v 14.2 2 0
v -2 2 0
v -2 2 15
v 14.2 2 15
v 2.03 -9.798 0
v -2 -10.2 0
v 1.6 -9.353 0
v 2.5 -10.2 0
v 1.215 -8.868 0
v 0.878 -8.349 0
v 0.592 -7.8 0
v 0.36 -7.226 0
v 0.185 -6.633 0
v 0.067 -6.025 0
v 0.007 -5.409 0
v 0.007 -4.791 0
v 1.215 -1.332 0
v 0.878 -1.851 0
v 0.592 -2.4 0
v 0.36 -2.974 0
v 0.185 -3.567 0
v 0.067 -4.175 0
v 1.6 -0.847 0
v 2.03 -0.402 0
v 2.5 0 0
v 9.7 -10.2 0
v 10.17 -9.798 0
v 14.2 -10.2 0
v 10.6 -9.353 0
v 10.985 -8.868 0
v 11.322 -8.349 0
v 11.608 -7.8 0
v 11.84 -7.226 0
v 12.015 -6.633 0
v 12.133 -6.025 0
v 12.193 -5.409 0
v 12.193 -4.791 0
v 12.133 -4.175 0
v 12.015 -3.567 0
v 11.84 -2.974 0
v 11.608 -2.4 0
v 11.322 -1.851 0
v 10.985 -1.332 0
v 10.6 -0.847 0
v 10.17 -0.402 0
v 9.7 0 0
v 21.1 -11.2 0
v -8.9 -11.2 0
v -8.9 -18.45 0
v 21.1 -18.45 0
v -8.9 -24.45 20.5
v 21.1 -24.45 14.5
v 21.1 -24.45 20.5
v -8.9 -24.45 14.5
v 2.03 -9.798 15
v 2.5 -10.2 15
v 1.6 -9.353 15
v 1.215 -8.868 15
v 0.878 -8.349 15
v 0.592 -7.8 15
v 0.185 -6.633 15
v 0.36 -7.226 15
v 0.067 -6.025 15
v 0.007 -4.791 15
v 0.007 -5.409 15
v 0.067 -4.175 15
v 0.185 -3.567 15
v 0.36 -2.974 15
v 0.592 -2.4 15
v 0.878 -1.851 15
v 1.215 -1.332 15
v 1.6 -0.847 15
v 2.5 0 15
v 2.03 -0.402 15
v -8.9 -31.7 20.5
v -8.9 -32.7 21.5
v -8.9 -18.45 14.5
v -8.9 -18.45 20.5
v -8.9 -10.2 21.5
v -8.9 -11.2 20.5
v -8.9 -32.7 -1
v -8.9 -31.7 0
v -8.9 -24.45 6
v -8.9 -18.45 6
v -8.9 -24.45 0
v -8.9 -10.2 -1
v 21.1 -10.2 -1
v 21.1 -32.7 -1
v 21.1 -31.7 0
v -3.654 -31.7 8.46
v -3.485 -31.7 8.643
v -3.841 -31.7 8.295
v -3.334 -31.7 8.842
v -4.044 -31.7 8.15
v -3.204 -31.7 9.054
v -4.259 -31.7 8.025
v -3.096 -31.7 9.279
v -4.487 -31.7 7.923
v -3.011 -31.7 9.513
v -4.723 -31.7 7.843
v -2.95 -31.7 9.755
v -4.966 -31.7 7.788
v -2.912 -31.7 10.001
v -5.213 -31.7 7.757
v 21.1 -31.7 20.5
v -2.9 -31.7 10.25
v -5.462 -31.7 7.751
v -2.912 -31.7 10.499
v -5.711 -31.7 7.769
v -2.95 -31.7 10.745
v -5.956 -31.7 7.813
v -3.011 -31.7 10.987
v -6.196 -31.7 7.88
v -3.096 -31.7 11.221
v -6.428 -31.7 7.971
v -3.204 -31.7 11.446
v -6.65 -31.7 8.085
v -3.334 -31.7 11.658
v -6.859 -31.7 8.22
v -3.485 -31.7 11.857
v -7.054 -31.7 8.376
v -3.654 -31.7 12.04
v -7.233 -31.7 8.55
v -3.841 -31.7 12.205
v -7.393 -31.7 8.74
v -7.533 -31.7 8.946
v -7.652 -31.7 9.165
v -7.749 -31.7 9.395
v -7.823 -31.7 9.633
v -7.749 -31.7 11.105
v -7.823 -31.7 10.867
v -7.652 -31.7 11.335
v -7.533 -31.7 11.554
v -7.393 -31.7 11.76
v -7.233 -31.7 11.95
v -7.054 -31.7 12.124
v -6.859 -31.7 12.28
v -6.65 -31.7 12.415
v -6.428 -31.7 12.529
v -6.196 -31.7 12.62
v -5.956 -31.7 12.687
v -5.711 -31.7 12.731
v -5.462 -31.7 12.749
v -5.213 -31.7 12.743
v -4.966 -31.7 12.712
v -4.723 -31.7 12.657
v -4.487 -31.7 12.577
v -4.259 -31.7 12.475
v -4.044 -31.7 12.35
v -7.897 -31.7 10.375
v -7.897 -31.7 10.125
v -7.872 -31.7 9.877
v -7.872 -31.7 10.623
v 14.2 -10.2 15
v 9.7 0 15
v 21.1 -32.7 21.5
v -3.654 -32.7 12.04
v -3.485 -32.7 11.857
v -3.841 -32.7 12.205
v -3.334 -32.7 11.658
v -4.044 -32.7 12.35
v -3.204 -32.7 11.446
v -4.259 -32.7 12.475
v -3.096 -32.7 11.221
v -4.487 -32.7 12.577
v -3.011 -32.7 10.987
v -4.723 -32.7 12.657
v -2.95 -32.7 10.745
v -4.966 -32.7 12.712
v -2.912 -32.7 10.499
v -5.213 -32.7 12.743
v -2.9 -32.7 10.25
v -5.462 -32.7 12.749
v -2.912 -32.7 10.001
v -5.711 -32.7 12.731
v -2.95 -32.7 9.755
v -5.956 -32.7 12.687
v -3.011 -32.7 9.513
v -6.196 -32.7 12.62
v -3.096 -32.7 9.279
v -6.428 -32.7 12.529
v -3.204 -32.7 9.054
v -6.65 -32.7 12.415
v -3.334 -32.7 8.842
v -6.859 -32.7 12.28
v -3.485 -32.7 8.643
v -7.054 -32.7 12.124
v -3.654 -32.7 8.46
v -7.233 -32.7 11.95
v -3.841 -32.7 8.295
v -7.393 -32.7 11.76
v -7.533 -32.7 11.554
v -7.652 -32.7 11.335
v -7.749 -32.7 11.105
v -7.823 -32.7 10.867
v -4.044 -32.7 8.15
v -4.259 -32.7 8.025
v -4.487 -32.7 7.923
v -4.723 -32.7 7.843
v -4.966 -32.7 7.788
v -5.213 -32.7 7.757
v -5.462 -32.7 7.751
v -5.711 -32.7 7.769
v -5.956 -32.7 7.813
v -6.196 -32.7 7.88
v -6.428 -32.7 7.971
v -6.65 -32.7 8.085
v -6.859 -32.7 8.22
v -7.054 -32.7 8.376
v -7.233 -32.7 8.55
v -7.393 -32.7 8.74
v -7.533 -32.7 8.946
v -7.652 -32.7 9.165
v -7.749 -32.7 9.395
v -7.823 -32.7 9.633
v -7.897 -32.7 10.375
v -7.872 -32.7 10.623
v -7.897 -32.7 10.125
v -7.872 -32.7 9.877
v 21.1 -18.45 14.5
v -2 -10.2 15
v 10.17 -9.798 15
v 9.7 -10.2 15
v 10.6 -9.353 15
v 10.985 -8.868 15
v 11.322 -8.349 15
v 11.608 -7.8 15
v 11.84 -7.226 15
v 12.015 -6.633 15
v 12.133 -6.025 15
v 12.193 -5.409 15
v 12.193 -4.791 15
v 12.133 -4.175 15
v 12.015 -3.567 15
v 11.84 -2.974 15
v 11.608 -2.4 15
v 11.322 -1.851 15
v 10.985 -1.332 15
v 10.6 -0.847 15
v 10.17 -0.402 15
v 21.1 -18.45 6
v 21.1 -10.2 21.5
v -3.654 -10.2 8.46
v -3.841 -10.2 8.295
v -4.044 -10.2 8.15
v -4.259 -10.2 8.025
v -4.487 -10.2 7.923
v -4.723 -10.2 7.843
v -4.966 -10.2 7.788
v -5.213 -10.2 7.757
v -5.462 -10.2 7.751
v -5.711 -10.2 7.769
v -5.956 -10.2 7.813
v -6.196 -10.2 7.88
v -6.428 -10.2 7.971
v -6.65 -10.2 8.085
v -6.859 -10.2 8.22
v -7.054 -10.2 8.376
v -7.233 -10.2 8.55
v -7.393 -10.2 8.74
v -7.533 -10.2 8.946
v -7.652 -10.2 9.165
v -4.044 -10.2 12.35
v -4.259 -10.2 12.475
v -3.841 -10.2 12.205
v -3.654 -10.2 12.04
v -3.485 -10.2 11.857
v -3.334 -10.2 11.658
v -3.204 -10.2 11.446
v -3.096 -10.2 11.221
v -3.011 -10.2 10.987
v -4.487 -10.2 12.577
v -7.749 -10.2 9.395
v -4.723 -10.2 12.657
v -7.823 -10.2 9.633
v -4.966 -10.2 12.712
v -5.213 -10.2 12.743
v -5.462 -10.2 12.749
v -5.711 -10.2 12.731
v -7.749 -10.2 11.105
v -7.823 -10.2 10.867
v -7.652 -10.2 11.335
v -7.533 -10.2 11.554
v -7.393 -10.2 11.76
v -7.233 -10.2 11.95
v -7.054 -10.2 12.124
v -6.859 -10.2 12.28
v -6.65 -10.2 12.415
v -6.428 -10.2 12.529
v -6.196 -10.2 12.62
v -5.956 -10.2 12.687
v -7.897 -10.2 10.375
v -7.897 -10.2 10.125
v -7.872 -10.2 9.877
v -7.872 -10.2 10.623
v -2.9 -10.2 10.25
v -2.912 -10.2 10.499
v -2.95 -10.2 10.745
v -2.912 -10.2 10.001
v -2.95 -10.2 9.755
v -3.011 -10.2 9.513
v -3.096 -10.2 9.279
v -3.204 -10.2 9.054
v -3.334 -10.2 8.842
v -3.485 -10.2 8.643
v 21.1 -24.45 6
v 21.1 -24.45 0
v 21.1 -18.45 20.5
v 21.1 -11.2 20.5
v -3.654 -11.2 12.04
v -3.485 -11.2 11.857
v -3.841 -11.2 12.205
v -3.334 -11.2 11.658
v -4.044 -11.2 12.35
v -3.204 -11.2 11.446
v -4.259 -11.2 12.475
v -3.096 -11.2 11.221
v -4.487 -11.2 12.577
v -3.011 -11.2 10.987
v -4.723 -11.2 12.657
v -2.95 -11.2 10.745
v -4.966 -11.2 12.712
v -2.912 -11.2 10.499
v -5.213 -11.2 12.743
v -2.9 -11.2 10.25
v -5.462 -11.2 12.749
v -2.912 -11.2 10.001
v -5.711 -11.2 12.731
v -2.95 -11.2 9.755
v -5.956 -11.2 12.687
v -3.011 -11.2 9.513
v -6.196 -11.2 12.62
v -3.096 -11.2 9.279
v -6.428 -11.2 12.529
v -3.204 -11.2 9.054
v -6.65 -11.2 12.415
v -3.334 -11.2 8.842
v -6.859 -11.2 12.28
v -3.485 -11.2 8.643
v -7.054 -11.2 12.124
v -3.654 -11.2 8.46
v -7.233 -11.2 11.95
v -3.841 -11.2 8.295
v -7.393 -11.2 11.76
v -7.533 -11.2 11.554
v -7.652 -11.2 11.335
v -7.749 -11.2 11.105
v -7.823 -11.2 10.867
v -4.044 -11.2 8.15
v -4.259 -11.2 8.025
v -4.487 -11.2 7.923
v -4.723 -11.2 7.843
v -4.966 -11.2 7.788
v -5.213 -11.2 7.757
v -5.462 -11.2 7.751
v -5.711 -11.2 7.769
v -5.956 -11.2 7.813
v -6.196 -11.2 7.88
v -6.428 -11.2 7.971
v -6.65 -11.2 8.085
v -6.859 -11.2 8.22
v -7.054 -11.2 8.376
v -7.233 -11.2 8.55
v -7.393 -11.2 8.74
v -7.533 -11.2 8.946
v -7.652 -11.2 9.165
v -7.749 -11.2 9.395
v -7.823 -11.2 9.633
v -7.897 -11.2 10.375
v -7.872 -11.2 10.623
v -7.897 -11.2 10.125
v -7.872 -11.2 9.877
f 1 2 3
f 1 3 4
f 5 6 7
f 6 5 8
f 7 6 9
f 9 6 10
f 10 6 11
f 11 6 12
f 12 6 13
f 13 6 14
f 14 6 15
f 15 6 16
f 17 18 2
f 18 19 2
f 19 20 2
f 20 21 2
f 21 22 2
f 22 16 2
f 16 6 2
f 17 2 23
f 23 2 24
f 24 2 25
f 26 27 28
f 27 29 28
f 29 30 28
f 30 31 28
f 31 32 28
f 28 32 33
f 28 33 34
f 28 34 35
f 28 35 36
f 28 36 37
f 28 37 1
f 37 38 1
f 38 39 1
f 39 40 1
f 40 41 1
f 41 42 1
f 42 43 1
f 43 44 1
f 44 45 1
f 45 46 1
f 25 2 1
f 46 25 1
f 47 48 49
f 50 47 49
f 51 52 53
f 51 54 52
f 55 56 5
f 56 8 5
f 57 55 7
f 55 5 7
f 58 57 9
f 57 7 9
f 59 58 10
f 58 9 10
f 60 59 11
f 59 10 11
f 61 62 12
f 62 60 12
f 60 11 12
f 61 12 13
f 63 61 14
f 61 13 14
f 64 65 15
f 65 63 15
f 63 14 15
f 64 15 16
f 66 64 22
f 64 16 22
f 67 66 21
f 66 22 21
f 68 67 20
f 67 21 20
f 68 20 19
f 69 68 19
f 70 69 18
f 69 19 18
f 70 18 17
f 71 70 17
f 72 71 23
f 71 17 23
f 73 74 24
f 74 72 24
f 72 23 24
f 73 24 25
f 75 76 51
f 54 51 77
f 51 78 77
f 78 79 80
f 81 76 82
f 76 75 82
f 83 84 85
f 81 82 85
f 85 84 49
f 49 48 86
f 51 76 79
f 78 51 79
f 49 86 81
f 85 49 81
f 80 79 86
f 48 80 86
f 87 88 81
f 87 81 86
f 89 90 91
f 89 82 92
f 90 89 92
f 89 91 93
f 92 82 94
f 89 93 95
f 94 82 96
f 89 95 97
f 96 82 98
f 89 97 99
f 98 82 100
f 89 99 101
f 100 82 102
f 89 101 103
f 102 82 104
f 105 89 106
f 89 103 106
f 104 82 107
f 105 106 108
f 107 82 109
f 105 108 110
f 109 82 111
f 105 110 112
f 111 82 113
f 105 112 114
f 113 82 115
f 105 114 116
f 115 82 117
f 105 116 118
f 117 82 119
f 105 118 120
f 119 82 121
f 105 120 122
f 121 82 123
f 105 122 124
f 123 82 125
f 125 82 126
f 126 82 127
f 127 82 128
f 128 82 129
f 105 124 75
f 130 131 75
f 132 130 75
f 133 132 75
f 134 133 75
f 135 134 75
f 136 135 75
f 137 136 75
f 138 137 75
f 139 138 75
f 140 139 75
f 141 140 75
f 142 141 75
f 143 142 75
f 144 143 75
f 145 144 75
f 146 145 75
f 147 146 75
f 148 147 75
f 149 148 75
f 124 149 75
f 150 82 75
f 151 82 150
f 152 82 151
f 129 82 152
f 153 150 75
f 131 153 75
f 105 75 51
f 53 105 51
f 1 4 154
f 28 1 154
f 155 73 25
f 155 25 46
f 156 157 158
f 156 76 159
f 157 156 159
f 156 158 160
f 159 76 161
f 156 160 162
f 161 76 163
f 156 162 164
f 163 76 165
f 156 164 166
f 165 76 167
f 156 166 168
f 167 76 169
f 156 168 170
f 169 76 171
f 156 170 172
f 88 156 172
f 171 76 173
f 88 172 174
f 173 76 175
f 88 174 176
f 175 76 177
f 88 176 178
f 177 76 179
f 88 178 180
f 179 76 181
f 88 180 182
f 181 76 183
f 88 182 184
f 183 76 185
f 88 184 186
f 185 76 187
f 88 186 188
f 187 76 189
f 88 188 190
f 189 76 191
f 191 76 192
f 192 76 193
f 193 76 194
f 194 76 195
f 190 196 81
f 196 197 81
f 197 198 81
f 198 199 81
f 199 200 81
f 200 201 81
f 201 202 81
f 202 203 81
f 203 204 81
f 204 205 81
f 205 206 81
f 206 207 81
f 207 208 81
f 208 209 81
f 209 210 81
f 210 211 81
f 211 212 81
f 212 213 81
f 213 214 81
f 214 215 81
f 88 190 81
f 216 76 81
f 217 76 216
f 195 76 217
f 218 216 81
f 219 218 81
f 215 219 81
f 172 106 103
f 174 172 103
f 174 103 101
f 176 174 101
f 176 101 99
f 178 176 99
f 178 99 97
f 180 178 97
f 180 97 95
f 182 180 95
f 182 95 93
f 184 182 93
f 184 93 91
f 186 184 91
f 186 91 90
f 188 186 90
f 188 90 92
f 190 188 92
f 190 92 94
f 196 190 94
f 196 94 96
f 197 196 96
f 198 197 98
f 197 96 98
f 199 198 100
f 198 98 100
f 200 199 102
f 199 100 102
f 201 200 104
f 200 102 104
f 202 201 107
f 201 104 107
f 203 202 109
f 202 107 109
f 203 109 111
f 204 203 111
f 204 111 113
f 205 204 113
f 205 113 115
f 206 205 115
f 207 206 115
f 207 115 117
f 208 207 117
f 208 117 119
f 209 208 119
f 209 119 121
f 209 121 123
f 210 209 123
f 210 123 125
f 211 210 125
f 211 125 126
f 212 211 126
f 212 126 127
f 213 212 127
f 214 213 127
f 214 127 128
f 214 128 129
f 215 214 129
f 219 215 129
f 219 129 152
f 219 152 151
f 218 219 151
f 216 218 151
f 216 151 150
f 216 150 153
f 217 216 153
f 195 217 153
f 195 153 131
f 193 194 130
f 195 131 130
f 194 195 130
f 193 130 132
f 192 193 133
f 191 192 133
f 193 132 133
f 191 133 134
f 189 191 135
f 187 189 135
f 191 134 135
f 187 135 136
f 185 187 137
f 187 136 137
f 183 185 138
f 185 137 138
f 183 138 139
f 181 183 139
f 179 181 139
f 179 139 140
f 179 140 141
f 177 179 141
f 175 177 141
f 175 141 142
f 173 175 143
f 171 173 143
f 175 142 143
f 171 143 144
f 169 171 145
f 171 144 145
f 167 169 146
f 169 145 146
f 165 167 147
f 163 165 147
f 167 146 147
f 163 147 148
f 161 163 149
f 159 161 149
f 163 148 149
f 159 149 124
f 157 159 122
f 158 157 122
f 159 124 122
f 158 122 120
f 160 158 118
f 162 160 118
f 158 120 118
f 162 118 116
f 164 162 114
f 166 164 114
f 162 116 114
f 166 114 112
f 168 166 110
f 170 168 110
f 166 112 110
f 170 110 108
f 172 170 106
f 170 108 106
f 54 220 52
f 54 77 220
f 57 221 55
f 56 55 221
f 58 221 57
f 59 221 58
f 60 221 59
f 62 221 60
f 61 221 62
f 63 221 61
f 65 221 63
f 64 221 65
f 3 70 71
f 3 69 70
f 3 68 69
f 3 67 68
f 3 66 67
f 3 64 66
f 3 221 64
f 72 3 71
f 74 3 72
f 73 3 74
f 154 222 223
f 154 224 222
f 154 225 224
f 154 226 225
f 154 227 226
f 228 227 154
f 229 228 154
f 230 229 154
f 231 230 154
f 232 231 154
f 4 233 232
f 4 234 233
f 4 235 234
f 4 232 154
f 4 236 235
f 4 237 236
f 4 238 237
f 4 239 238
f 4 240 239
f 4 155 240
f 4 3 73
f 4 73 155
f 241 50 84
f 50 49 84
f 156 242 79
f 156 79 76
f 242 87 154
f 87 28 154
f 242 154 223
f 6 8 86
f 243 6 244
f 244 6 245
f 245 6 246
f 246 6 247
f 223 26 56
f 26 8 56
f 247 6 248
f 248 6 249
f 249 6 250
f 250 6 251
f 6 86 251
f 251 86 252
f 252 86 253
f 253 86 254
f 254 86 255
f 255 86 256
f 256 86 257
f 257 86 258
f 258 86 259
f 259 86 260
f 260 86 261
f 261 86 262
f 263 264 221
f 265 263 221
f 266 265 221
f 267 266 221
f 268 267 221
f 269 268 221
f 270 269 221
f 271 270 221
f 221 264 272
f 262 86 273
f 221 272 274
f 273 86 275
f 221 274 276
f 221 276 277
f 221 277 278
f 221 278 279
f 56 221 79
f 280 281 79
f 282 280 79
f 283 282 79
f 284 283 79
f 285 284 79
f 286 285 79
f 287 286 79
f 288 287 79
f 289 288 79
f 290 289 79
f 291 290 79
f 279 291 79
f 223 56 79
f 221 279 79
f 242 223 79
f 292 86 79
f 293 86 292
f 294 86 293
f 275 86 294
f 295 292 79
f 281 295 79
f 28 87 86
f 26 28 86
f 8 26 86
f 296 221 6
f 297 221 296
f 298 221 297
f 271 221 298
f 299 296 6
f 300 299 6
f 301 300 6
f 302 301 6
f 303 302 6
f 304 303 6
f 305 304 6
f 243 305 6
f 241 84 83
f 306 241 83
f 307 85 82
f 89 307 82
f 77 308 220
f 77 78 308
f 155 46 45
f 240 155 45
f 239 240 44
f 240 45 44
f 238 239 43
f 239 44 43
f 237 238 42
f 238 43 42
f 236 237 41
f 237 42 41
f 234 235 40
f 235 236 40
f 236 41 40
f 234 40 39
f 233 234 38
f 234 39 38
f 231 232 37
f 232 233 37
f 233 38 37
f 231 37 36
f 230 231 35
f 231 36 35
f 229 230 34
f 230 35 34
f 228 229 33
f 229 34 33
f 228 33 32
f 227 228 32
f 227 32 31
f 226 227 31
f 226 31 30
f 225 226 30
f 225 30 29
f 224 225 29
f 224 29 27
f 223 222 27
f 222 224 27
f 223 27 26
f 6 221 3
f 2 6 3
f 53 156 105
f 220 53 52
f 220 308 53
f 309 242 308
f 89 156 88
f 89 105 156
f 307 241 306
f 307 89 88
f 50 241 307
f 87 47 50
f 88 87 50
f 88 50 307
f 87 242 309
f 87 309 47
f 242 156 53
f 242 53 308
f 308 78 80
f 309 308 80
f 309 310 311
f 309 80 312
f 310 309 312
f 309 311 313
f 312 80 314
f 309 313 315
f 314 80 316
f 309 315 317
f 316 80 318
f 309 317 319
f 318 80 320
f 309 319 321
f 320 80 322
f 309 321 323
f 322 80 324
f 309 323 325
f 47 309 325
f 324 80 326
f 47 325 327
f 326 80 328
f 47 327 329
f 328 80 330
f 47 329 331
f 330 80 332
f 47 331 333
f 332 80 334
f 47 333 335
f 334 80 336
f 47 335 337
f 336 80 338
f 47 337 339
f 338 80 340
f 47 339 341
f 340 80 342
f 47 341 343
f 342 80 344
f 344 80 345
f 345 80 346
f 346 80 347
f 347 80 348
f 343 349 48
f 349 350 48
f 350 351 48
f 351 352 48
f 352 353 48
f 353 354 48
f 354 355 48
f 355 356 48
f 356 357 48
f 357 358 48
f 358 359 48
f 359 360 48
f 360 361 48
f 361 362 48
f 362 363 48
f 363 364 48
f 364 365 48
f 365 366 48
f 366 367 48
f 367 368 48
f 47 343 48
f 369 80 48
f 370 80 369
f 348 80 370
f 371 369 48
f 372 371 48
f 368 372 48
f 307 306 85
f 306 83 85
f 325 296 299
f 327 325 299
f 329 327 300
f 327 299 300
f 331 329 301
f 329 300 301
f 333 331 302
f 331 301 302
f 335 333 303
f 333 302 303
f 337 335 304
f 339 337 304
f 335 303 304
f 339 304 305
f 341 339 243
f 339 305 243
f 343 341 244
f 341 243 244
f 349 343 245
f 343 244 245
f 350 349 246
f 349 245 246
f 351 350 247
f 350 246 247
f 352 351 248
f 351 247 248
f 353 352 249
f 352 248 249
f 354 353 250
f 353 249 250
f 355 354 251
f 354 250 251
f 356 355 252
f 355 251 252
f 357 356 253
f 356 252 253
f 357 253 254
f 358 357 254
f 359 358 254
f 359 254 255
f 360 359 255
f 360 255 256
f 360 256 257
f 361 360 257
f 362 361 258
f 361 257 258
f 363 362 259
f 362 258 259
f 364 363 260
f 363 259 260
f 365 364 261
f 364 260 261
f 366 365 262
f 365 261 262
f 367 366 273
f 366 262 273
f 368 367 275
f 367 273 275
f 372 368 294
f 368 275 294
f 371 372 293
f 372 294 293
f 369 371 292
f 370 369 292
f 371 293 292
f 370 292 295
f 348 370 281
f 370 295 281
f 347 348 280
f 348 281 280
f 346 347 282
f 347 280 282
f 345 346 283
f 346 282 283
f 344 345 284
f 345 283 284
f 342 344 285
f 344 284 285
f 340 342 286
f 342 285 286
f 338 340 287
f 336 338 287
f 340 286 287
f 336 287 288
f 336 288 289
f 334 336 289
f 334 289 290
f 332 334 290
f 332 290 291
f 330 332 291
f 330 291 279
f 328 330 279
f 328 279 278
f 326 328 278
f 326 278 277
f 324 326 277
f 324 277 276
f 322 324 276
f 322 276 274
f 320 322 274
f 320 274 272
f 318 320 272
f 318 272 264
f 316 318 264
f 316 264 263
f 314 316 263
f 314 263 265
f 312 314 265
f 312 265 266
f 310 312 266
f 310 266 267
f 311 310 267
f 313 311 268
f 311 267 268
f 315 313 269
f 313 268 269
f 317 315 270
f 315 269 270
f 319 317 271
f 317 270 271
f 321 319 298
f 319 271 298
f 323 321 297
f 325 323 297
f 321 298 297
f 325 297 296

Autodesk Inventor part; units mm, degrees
ref_plane "YZ Plane" through (0, 0, 0) normal (1, 0, 0) x (0, 1, 0)
ref_plane "XZ Plane" through (0, 0, 0) normal (0, 1, 0) x (-1, 0, 0)
ref_plane "XY Plane" through (0, 0, 0) normal (0, 0, 1) x (1, 0, 0)
sketch "Sketch4" plane through (0, 0, 0) normal (0, 0, 1) x (1, 0, 0)
  arc A0 (2.5, 0) -> (2.5, -10.2) centre (6.452, -5.1) ccw
  arc A1 (9.7, -10.2) -> (9.7, 0) centre (5.748, -5.1) ccw
  line L0 (-2, 2) -> (14.2, 2)
  line L1 (14.2, 2) -> (14.2, -10.2)
  line L2 (-2, -10.2) -> (-2, 2)
  line L3 (-2, -10.2) -> (2.5, -10.2)
  line L4 (9.7, -10.2) -> (14.2, -10.2)
  line L5 (2.5, 0) -> (9.7, 0)
  point P0 (0, 0)
  point P1 (6.1, 0)
  point P2 (6.1, -10.2)
  dimension "d50" = 3.6
  dimension "d51" = 3.6
  dimension "d52" = 3.6
  dimension "d53" = 3.6
extrude "Extrusion4" add sketch "Sketch4" along normal blind 15
ref_plane "Work Plane2" through (6.1, -10.2, 0) normal (1, 0, 0) x (0, 0, -1)
sketch "Sketch5" plane through (6.1, -10.2, 0) normal (1, 0, 0) x (0, 0, -1)
  line L0 (0, 0) -> (0, 12.2) projected
  line L1 (0, 12.2) -> (-15, 12.2) projected
  line L2 (-15, 0) -> (-15, 12.2) projected
  line L3 (0, 0) -> (-15, 0) projected
  line L4 (1, 0) -> (-21.5, 0)
  line L5 (-21.5, 0) -> (-21.5, -22.5)
  line L6 (-21.5, -22.5) -> (1, -22.5)
  line L7 (1, -22.5) -> (1, 0)
  line L8 (-20.5, -1) -> (0, -1)
  line L9 (0, -21.5) -> (-20.5, -21.5)
  line L10 (-20.5, -8.25) -> (-14.5, -8.25)
  line L11 (-14.5, -8.25) -> (-14.5, -14.25)
  line L12 (-14.5, -14.25) -> (-20.5, -14.25)
  line L13 (0, -8.25) -> (-6, -8.25)
  line L14 (-6, -8.25) -> (-6, -14.25)
  line L15 (-6, -14.25) -> (0, -14.25)
  line L16 (-20.5, -21.5) -> (-20.5, -14.25)
  line L17 (-20.5, -8.25) -> (-20.5, -1)
  line L18 (0, -1) -> (0, -8.25)
  line L19 (0, -14.25) -> (0, -21.5)
  point P0 (0, 10.2)
  point P1 (-20.5, -11.25)
  point P2 (-20.5, -11.25)
  dimension "d58" = 22.5
  dimension "d59" = 22.5
  dimension "d60" = 1
  dimension "d61" = 1
extrude "Extrusion5" add sketch "Sketch5" along normal mid plane 30 contours L4 L7 L6 L5 L3
sketch "Sketch6" plane through (-8.9, -10.2, 21.5) normal (0, 1, 0) x (1, 0, 0)
  circle A0 centre (3.5, 11.25) radius 2.5
  line L0 (0, 0) -> (0, 22.5) projected
  point P0 (8.9, 21.5)
  dimension "d69" = 5
  dimension "d70" = 3.5
extrude "Extrusion6" cut sketch "Sketch6" along normal through all both and the other way through all
properties part number "motor mount left"
